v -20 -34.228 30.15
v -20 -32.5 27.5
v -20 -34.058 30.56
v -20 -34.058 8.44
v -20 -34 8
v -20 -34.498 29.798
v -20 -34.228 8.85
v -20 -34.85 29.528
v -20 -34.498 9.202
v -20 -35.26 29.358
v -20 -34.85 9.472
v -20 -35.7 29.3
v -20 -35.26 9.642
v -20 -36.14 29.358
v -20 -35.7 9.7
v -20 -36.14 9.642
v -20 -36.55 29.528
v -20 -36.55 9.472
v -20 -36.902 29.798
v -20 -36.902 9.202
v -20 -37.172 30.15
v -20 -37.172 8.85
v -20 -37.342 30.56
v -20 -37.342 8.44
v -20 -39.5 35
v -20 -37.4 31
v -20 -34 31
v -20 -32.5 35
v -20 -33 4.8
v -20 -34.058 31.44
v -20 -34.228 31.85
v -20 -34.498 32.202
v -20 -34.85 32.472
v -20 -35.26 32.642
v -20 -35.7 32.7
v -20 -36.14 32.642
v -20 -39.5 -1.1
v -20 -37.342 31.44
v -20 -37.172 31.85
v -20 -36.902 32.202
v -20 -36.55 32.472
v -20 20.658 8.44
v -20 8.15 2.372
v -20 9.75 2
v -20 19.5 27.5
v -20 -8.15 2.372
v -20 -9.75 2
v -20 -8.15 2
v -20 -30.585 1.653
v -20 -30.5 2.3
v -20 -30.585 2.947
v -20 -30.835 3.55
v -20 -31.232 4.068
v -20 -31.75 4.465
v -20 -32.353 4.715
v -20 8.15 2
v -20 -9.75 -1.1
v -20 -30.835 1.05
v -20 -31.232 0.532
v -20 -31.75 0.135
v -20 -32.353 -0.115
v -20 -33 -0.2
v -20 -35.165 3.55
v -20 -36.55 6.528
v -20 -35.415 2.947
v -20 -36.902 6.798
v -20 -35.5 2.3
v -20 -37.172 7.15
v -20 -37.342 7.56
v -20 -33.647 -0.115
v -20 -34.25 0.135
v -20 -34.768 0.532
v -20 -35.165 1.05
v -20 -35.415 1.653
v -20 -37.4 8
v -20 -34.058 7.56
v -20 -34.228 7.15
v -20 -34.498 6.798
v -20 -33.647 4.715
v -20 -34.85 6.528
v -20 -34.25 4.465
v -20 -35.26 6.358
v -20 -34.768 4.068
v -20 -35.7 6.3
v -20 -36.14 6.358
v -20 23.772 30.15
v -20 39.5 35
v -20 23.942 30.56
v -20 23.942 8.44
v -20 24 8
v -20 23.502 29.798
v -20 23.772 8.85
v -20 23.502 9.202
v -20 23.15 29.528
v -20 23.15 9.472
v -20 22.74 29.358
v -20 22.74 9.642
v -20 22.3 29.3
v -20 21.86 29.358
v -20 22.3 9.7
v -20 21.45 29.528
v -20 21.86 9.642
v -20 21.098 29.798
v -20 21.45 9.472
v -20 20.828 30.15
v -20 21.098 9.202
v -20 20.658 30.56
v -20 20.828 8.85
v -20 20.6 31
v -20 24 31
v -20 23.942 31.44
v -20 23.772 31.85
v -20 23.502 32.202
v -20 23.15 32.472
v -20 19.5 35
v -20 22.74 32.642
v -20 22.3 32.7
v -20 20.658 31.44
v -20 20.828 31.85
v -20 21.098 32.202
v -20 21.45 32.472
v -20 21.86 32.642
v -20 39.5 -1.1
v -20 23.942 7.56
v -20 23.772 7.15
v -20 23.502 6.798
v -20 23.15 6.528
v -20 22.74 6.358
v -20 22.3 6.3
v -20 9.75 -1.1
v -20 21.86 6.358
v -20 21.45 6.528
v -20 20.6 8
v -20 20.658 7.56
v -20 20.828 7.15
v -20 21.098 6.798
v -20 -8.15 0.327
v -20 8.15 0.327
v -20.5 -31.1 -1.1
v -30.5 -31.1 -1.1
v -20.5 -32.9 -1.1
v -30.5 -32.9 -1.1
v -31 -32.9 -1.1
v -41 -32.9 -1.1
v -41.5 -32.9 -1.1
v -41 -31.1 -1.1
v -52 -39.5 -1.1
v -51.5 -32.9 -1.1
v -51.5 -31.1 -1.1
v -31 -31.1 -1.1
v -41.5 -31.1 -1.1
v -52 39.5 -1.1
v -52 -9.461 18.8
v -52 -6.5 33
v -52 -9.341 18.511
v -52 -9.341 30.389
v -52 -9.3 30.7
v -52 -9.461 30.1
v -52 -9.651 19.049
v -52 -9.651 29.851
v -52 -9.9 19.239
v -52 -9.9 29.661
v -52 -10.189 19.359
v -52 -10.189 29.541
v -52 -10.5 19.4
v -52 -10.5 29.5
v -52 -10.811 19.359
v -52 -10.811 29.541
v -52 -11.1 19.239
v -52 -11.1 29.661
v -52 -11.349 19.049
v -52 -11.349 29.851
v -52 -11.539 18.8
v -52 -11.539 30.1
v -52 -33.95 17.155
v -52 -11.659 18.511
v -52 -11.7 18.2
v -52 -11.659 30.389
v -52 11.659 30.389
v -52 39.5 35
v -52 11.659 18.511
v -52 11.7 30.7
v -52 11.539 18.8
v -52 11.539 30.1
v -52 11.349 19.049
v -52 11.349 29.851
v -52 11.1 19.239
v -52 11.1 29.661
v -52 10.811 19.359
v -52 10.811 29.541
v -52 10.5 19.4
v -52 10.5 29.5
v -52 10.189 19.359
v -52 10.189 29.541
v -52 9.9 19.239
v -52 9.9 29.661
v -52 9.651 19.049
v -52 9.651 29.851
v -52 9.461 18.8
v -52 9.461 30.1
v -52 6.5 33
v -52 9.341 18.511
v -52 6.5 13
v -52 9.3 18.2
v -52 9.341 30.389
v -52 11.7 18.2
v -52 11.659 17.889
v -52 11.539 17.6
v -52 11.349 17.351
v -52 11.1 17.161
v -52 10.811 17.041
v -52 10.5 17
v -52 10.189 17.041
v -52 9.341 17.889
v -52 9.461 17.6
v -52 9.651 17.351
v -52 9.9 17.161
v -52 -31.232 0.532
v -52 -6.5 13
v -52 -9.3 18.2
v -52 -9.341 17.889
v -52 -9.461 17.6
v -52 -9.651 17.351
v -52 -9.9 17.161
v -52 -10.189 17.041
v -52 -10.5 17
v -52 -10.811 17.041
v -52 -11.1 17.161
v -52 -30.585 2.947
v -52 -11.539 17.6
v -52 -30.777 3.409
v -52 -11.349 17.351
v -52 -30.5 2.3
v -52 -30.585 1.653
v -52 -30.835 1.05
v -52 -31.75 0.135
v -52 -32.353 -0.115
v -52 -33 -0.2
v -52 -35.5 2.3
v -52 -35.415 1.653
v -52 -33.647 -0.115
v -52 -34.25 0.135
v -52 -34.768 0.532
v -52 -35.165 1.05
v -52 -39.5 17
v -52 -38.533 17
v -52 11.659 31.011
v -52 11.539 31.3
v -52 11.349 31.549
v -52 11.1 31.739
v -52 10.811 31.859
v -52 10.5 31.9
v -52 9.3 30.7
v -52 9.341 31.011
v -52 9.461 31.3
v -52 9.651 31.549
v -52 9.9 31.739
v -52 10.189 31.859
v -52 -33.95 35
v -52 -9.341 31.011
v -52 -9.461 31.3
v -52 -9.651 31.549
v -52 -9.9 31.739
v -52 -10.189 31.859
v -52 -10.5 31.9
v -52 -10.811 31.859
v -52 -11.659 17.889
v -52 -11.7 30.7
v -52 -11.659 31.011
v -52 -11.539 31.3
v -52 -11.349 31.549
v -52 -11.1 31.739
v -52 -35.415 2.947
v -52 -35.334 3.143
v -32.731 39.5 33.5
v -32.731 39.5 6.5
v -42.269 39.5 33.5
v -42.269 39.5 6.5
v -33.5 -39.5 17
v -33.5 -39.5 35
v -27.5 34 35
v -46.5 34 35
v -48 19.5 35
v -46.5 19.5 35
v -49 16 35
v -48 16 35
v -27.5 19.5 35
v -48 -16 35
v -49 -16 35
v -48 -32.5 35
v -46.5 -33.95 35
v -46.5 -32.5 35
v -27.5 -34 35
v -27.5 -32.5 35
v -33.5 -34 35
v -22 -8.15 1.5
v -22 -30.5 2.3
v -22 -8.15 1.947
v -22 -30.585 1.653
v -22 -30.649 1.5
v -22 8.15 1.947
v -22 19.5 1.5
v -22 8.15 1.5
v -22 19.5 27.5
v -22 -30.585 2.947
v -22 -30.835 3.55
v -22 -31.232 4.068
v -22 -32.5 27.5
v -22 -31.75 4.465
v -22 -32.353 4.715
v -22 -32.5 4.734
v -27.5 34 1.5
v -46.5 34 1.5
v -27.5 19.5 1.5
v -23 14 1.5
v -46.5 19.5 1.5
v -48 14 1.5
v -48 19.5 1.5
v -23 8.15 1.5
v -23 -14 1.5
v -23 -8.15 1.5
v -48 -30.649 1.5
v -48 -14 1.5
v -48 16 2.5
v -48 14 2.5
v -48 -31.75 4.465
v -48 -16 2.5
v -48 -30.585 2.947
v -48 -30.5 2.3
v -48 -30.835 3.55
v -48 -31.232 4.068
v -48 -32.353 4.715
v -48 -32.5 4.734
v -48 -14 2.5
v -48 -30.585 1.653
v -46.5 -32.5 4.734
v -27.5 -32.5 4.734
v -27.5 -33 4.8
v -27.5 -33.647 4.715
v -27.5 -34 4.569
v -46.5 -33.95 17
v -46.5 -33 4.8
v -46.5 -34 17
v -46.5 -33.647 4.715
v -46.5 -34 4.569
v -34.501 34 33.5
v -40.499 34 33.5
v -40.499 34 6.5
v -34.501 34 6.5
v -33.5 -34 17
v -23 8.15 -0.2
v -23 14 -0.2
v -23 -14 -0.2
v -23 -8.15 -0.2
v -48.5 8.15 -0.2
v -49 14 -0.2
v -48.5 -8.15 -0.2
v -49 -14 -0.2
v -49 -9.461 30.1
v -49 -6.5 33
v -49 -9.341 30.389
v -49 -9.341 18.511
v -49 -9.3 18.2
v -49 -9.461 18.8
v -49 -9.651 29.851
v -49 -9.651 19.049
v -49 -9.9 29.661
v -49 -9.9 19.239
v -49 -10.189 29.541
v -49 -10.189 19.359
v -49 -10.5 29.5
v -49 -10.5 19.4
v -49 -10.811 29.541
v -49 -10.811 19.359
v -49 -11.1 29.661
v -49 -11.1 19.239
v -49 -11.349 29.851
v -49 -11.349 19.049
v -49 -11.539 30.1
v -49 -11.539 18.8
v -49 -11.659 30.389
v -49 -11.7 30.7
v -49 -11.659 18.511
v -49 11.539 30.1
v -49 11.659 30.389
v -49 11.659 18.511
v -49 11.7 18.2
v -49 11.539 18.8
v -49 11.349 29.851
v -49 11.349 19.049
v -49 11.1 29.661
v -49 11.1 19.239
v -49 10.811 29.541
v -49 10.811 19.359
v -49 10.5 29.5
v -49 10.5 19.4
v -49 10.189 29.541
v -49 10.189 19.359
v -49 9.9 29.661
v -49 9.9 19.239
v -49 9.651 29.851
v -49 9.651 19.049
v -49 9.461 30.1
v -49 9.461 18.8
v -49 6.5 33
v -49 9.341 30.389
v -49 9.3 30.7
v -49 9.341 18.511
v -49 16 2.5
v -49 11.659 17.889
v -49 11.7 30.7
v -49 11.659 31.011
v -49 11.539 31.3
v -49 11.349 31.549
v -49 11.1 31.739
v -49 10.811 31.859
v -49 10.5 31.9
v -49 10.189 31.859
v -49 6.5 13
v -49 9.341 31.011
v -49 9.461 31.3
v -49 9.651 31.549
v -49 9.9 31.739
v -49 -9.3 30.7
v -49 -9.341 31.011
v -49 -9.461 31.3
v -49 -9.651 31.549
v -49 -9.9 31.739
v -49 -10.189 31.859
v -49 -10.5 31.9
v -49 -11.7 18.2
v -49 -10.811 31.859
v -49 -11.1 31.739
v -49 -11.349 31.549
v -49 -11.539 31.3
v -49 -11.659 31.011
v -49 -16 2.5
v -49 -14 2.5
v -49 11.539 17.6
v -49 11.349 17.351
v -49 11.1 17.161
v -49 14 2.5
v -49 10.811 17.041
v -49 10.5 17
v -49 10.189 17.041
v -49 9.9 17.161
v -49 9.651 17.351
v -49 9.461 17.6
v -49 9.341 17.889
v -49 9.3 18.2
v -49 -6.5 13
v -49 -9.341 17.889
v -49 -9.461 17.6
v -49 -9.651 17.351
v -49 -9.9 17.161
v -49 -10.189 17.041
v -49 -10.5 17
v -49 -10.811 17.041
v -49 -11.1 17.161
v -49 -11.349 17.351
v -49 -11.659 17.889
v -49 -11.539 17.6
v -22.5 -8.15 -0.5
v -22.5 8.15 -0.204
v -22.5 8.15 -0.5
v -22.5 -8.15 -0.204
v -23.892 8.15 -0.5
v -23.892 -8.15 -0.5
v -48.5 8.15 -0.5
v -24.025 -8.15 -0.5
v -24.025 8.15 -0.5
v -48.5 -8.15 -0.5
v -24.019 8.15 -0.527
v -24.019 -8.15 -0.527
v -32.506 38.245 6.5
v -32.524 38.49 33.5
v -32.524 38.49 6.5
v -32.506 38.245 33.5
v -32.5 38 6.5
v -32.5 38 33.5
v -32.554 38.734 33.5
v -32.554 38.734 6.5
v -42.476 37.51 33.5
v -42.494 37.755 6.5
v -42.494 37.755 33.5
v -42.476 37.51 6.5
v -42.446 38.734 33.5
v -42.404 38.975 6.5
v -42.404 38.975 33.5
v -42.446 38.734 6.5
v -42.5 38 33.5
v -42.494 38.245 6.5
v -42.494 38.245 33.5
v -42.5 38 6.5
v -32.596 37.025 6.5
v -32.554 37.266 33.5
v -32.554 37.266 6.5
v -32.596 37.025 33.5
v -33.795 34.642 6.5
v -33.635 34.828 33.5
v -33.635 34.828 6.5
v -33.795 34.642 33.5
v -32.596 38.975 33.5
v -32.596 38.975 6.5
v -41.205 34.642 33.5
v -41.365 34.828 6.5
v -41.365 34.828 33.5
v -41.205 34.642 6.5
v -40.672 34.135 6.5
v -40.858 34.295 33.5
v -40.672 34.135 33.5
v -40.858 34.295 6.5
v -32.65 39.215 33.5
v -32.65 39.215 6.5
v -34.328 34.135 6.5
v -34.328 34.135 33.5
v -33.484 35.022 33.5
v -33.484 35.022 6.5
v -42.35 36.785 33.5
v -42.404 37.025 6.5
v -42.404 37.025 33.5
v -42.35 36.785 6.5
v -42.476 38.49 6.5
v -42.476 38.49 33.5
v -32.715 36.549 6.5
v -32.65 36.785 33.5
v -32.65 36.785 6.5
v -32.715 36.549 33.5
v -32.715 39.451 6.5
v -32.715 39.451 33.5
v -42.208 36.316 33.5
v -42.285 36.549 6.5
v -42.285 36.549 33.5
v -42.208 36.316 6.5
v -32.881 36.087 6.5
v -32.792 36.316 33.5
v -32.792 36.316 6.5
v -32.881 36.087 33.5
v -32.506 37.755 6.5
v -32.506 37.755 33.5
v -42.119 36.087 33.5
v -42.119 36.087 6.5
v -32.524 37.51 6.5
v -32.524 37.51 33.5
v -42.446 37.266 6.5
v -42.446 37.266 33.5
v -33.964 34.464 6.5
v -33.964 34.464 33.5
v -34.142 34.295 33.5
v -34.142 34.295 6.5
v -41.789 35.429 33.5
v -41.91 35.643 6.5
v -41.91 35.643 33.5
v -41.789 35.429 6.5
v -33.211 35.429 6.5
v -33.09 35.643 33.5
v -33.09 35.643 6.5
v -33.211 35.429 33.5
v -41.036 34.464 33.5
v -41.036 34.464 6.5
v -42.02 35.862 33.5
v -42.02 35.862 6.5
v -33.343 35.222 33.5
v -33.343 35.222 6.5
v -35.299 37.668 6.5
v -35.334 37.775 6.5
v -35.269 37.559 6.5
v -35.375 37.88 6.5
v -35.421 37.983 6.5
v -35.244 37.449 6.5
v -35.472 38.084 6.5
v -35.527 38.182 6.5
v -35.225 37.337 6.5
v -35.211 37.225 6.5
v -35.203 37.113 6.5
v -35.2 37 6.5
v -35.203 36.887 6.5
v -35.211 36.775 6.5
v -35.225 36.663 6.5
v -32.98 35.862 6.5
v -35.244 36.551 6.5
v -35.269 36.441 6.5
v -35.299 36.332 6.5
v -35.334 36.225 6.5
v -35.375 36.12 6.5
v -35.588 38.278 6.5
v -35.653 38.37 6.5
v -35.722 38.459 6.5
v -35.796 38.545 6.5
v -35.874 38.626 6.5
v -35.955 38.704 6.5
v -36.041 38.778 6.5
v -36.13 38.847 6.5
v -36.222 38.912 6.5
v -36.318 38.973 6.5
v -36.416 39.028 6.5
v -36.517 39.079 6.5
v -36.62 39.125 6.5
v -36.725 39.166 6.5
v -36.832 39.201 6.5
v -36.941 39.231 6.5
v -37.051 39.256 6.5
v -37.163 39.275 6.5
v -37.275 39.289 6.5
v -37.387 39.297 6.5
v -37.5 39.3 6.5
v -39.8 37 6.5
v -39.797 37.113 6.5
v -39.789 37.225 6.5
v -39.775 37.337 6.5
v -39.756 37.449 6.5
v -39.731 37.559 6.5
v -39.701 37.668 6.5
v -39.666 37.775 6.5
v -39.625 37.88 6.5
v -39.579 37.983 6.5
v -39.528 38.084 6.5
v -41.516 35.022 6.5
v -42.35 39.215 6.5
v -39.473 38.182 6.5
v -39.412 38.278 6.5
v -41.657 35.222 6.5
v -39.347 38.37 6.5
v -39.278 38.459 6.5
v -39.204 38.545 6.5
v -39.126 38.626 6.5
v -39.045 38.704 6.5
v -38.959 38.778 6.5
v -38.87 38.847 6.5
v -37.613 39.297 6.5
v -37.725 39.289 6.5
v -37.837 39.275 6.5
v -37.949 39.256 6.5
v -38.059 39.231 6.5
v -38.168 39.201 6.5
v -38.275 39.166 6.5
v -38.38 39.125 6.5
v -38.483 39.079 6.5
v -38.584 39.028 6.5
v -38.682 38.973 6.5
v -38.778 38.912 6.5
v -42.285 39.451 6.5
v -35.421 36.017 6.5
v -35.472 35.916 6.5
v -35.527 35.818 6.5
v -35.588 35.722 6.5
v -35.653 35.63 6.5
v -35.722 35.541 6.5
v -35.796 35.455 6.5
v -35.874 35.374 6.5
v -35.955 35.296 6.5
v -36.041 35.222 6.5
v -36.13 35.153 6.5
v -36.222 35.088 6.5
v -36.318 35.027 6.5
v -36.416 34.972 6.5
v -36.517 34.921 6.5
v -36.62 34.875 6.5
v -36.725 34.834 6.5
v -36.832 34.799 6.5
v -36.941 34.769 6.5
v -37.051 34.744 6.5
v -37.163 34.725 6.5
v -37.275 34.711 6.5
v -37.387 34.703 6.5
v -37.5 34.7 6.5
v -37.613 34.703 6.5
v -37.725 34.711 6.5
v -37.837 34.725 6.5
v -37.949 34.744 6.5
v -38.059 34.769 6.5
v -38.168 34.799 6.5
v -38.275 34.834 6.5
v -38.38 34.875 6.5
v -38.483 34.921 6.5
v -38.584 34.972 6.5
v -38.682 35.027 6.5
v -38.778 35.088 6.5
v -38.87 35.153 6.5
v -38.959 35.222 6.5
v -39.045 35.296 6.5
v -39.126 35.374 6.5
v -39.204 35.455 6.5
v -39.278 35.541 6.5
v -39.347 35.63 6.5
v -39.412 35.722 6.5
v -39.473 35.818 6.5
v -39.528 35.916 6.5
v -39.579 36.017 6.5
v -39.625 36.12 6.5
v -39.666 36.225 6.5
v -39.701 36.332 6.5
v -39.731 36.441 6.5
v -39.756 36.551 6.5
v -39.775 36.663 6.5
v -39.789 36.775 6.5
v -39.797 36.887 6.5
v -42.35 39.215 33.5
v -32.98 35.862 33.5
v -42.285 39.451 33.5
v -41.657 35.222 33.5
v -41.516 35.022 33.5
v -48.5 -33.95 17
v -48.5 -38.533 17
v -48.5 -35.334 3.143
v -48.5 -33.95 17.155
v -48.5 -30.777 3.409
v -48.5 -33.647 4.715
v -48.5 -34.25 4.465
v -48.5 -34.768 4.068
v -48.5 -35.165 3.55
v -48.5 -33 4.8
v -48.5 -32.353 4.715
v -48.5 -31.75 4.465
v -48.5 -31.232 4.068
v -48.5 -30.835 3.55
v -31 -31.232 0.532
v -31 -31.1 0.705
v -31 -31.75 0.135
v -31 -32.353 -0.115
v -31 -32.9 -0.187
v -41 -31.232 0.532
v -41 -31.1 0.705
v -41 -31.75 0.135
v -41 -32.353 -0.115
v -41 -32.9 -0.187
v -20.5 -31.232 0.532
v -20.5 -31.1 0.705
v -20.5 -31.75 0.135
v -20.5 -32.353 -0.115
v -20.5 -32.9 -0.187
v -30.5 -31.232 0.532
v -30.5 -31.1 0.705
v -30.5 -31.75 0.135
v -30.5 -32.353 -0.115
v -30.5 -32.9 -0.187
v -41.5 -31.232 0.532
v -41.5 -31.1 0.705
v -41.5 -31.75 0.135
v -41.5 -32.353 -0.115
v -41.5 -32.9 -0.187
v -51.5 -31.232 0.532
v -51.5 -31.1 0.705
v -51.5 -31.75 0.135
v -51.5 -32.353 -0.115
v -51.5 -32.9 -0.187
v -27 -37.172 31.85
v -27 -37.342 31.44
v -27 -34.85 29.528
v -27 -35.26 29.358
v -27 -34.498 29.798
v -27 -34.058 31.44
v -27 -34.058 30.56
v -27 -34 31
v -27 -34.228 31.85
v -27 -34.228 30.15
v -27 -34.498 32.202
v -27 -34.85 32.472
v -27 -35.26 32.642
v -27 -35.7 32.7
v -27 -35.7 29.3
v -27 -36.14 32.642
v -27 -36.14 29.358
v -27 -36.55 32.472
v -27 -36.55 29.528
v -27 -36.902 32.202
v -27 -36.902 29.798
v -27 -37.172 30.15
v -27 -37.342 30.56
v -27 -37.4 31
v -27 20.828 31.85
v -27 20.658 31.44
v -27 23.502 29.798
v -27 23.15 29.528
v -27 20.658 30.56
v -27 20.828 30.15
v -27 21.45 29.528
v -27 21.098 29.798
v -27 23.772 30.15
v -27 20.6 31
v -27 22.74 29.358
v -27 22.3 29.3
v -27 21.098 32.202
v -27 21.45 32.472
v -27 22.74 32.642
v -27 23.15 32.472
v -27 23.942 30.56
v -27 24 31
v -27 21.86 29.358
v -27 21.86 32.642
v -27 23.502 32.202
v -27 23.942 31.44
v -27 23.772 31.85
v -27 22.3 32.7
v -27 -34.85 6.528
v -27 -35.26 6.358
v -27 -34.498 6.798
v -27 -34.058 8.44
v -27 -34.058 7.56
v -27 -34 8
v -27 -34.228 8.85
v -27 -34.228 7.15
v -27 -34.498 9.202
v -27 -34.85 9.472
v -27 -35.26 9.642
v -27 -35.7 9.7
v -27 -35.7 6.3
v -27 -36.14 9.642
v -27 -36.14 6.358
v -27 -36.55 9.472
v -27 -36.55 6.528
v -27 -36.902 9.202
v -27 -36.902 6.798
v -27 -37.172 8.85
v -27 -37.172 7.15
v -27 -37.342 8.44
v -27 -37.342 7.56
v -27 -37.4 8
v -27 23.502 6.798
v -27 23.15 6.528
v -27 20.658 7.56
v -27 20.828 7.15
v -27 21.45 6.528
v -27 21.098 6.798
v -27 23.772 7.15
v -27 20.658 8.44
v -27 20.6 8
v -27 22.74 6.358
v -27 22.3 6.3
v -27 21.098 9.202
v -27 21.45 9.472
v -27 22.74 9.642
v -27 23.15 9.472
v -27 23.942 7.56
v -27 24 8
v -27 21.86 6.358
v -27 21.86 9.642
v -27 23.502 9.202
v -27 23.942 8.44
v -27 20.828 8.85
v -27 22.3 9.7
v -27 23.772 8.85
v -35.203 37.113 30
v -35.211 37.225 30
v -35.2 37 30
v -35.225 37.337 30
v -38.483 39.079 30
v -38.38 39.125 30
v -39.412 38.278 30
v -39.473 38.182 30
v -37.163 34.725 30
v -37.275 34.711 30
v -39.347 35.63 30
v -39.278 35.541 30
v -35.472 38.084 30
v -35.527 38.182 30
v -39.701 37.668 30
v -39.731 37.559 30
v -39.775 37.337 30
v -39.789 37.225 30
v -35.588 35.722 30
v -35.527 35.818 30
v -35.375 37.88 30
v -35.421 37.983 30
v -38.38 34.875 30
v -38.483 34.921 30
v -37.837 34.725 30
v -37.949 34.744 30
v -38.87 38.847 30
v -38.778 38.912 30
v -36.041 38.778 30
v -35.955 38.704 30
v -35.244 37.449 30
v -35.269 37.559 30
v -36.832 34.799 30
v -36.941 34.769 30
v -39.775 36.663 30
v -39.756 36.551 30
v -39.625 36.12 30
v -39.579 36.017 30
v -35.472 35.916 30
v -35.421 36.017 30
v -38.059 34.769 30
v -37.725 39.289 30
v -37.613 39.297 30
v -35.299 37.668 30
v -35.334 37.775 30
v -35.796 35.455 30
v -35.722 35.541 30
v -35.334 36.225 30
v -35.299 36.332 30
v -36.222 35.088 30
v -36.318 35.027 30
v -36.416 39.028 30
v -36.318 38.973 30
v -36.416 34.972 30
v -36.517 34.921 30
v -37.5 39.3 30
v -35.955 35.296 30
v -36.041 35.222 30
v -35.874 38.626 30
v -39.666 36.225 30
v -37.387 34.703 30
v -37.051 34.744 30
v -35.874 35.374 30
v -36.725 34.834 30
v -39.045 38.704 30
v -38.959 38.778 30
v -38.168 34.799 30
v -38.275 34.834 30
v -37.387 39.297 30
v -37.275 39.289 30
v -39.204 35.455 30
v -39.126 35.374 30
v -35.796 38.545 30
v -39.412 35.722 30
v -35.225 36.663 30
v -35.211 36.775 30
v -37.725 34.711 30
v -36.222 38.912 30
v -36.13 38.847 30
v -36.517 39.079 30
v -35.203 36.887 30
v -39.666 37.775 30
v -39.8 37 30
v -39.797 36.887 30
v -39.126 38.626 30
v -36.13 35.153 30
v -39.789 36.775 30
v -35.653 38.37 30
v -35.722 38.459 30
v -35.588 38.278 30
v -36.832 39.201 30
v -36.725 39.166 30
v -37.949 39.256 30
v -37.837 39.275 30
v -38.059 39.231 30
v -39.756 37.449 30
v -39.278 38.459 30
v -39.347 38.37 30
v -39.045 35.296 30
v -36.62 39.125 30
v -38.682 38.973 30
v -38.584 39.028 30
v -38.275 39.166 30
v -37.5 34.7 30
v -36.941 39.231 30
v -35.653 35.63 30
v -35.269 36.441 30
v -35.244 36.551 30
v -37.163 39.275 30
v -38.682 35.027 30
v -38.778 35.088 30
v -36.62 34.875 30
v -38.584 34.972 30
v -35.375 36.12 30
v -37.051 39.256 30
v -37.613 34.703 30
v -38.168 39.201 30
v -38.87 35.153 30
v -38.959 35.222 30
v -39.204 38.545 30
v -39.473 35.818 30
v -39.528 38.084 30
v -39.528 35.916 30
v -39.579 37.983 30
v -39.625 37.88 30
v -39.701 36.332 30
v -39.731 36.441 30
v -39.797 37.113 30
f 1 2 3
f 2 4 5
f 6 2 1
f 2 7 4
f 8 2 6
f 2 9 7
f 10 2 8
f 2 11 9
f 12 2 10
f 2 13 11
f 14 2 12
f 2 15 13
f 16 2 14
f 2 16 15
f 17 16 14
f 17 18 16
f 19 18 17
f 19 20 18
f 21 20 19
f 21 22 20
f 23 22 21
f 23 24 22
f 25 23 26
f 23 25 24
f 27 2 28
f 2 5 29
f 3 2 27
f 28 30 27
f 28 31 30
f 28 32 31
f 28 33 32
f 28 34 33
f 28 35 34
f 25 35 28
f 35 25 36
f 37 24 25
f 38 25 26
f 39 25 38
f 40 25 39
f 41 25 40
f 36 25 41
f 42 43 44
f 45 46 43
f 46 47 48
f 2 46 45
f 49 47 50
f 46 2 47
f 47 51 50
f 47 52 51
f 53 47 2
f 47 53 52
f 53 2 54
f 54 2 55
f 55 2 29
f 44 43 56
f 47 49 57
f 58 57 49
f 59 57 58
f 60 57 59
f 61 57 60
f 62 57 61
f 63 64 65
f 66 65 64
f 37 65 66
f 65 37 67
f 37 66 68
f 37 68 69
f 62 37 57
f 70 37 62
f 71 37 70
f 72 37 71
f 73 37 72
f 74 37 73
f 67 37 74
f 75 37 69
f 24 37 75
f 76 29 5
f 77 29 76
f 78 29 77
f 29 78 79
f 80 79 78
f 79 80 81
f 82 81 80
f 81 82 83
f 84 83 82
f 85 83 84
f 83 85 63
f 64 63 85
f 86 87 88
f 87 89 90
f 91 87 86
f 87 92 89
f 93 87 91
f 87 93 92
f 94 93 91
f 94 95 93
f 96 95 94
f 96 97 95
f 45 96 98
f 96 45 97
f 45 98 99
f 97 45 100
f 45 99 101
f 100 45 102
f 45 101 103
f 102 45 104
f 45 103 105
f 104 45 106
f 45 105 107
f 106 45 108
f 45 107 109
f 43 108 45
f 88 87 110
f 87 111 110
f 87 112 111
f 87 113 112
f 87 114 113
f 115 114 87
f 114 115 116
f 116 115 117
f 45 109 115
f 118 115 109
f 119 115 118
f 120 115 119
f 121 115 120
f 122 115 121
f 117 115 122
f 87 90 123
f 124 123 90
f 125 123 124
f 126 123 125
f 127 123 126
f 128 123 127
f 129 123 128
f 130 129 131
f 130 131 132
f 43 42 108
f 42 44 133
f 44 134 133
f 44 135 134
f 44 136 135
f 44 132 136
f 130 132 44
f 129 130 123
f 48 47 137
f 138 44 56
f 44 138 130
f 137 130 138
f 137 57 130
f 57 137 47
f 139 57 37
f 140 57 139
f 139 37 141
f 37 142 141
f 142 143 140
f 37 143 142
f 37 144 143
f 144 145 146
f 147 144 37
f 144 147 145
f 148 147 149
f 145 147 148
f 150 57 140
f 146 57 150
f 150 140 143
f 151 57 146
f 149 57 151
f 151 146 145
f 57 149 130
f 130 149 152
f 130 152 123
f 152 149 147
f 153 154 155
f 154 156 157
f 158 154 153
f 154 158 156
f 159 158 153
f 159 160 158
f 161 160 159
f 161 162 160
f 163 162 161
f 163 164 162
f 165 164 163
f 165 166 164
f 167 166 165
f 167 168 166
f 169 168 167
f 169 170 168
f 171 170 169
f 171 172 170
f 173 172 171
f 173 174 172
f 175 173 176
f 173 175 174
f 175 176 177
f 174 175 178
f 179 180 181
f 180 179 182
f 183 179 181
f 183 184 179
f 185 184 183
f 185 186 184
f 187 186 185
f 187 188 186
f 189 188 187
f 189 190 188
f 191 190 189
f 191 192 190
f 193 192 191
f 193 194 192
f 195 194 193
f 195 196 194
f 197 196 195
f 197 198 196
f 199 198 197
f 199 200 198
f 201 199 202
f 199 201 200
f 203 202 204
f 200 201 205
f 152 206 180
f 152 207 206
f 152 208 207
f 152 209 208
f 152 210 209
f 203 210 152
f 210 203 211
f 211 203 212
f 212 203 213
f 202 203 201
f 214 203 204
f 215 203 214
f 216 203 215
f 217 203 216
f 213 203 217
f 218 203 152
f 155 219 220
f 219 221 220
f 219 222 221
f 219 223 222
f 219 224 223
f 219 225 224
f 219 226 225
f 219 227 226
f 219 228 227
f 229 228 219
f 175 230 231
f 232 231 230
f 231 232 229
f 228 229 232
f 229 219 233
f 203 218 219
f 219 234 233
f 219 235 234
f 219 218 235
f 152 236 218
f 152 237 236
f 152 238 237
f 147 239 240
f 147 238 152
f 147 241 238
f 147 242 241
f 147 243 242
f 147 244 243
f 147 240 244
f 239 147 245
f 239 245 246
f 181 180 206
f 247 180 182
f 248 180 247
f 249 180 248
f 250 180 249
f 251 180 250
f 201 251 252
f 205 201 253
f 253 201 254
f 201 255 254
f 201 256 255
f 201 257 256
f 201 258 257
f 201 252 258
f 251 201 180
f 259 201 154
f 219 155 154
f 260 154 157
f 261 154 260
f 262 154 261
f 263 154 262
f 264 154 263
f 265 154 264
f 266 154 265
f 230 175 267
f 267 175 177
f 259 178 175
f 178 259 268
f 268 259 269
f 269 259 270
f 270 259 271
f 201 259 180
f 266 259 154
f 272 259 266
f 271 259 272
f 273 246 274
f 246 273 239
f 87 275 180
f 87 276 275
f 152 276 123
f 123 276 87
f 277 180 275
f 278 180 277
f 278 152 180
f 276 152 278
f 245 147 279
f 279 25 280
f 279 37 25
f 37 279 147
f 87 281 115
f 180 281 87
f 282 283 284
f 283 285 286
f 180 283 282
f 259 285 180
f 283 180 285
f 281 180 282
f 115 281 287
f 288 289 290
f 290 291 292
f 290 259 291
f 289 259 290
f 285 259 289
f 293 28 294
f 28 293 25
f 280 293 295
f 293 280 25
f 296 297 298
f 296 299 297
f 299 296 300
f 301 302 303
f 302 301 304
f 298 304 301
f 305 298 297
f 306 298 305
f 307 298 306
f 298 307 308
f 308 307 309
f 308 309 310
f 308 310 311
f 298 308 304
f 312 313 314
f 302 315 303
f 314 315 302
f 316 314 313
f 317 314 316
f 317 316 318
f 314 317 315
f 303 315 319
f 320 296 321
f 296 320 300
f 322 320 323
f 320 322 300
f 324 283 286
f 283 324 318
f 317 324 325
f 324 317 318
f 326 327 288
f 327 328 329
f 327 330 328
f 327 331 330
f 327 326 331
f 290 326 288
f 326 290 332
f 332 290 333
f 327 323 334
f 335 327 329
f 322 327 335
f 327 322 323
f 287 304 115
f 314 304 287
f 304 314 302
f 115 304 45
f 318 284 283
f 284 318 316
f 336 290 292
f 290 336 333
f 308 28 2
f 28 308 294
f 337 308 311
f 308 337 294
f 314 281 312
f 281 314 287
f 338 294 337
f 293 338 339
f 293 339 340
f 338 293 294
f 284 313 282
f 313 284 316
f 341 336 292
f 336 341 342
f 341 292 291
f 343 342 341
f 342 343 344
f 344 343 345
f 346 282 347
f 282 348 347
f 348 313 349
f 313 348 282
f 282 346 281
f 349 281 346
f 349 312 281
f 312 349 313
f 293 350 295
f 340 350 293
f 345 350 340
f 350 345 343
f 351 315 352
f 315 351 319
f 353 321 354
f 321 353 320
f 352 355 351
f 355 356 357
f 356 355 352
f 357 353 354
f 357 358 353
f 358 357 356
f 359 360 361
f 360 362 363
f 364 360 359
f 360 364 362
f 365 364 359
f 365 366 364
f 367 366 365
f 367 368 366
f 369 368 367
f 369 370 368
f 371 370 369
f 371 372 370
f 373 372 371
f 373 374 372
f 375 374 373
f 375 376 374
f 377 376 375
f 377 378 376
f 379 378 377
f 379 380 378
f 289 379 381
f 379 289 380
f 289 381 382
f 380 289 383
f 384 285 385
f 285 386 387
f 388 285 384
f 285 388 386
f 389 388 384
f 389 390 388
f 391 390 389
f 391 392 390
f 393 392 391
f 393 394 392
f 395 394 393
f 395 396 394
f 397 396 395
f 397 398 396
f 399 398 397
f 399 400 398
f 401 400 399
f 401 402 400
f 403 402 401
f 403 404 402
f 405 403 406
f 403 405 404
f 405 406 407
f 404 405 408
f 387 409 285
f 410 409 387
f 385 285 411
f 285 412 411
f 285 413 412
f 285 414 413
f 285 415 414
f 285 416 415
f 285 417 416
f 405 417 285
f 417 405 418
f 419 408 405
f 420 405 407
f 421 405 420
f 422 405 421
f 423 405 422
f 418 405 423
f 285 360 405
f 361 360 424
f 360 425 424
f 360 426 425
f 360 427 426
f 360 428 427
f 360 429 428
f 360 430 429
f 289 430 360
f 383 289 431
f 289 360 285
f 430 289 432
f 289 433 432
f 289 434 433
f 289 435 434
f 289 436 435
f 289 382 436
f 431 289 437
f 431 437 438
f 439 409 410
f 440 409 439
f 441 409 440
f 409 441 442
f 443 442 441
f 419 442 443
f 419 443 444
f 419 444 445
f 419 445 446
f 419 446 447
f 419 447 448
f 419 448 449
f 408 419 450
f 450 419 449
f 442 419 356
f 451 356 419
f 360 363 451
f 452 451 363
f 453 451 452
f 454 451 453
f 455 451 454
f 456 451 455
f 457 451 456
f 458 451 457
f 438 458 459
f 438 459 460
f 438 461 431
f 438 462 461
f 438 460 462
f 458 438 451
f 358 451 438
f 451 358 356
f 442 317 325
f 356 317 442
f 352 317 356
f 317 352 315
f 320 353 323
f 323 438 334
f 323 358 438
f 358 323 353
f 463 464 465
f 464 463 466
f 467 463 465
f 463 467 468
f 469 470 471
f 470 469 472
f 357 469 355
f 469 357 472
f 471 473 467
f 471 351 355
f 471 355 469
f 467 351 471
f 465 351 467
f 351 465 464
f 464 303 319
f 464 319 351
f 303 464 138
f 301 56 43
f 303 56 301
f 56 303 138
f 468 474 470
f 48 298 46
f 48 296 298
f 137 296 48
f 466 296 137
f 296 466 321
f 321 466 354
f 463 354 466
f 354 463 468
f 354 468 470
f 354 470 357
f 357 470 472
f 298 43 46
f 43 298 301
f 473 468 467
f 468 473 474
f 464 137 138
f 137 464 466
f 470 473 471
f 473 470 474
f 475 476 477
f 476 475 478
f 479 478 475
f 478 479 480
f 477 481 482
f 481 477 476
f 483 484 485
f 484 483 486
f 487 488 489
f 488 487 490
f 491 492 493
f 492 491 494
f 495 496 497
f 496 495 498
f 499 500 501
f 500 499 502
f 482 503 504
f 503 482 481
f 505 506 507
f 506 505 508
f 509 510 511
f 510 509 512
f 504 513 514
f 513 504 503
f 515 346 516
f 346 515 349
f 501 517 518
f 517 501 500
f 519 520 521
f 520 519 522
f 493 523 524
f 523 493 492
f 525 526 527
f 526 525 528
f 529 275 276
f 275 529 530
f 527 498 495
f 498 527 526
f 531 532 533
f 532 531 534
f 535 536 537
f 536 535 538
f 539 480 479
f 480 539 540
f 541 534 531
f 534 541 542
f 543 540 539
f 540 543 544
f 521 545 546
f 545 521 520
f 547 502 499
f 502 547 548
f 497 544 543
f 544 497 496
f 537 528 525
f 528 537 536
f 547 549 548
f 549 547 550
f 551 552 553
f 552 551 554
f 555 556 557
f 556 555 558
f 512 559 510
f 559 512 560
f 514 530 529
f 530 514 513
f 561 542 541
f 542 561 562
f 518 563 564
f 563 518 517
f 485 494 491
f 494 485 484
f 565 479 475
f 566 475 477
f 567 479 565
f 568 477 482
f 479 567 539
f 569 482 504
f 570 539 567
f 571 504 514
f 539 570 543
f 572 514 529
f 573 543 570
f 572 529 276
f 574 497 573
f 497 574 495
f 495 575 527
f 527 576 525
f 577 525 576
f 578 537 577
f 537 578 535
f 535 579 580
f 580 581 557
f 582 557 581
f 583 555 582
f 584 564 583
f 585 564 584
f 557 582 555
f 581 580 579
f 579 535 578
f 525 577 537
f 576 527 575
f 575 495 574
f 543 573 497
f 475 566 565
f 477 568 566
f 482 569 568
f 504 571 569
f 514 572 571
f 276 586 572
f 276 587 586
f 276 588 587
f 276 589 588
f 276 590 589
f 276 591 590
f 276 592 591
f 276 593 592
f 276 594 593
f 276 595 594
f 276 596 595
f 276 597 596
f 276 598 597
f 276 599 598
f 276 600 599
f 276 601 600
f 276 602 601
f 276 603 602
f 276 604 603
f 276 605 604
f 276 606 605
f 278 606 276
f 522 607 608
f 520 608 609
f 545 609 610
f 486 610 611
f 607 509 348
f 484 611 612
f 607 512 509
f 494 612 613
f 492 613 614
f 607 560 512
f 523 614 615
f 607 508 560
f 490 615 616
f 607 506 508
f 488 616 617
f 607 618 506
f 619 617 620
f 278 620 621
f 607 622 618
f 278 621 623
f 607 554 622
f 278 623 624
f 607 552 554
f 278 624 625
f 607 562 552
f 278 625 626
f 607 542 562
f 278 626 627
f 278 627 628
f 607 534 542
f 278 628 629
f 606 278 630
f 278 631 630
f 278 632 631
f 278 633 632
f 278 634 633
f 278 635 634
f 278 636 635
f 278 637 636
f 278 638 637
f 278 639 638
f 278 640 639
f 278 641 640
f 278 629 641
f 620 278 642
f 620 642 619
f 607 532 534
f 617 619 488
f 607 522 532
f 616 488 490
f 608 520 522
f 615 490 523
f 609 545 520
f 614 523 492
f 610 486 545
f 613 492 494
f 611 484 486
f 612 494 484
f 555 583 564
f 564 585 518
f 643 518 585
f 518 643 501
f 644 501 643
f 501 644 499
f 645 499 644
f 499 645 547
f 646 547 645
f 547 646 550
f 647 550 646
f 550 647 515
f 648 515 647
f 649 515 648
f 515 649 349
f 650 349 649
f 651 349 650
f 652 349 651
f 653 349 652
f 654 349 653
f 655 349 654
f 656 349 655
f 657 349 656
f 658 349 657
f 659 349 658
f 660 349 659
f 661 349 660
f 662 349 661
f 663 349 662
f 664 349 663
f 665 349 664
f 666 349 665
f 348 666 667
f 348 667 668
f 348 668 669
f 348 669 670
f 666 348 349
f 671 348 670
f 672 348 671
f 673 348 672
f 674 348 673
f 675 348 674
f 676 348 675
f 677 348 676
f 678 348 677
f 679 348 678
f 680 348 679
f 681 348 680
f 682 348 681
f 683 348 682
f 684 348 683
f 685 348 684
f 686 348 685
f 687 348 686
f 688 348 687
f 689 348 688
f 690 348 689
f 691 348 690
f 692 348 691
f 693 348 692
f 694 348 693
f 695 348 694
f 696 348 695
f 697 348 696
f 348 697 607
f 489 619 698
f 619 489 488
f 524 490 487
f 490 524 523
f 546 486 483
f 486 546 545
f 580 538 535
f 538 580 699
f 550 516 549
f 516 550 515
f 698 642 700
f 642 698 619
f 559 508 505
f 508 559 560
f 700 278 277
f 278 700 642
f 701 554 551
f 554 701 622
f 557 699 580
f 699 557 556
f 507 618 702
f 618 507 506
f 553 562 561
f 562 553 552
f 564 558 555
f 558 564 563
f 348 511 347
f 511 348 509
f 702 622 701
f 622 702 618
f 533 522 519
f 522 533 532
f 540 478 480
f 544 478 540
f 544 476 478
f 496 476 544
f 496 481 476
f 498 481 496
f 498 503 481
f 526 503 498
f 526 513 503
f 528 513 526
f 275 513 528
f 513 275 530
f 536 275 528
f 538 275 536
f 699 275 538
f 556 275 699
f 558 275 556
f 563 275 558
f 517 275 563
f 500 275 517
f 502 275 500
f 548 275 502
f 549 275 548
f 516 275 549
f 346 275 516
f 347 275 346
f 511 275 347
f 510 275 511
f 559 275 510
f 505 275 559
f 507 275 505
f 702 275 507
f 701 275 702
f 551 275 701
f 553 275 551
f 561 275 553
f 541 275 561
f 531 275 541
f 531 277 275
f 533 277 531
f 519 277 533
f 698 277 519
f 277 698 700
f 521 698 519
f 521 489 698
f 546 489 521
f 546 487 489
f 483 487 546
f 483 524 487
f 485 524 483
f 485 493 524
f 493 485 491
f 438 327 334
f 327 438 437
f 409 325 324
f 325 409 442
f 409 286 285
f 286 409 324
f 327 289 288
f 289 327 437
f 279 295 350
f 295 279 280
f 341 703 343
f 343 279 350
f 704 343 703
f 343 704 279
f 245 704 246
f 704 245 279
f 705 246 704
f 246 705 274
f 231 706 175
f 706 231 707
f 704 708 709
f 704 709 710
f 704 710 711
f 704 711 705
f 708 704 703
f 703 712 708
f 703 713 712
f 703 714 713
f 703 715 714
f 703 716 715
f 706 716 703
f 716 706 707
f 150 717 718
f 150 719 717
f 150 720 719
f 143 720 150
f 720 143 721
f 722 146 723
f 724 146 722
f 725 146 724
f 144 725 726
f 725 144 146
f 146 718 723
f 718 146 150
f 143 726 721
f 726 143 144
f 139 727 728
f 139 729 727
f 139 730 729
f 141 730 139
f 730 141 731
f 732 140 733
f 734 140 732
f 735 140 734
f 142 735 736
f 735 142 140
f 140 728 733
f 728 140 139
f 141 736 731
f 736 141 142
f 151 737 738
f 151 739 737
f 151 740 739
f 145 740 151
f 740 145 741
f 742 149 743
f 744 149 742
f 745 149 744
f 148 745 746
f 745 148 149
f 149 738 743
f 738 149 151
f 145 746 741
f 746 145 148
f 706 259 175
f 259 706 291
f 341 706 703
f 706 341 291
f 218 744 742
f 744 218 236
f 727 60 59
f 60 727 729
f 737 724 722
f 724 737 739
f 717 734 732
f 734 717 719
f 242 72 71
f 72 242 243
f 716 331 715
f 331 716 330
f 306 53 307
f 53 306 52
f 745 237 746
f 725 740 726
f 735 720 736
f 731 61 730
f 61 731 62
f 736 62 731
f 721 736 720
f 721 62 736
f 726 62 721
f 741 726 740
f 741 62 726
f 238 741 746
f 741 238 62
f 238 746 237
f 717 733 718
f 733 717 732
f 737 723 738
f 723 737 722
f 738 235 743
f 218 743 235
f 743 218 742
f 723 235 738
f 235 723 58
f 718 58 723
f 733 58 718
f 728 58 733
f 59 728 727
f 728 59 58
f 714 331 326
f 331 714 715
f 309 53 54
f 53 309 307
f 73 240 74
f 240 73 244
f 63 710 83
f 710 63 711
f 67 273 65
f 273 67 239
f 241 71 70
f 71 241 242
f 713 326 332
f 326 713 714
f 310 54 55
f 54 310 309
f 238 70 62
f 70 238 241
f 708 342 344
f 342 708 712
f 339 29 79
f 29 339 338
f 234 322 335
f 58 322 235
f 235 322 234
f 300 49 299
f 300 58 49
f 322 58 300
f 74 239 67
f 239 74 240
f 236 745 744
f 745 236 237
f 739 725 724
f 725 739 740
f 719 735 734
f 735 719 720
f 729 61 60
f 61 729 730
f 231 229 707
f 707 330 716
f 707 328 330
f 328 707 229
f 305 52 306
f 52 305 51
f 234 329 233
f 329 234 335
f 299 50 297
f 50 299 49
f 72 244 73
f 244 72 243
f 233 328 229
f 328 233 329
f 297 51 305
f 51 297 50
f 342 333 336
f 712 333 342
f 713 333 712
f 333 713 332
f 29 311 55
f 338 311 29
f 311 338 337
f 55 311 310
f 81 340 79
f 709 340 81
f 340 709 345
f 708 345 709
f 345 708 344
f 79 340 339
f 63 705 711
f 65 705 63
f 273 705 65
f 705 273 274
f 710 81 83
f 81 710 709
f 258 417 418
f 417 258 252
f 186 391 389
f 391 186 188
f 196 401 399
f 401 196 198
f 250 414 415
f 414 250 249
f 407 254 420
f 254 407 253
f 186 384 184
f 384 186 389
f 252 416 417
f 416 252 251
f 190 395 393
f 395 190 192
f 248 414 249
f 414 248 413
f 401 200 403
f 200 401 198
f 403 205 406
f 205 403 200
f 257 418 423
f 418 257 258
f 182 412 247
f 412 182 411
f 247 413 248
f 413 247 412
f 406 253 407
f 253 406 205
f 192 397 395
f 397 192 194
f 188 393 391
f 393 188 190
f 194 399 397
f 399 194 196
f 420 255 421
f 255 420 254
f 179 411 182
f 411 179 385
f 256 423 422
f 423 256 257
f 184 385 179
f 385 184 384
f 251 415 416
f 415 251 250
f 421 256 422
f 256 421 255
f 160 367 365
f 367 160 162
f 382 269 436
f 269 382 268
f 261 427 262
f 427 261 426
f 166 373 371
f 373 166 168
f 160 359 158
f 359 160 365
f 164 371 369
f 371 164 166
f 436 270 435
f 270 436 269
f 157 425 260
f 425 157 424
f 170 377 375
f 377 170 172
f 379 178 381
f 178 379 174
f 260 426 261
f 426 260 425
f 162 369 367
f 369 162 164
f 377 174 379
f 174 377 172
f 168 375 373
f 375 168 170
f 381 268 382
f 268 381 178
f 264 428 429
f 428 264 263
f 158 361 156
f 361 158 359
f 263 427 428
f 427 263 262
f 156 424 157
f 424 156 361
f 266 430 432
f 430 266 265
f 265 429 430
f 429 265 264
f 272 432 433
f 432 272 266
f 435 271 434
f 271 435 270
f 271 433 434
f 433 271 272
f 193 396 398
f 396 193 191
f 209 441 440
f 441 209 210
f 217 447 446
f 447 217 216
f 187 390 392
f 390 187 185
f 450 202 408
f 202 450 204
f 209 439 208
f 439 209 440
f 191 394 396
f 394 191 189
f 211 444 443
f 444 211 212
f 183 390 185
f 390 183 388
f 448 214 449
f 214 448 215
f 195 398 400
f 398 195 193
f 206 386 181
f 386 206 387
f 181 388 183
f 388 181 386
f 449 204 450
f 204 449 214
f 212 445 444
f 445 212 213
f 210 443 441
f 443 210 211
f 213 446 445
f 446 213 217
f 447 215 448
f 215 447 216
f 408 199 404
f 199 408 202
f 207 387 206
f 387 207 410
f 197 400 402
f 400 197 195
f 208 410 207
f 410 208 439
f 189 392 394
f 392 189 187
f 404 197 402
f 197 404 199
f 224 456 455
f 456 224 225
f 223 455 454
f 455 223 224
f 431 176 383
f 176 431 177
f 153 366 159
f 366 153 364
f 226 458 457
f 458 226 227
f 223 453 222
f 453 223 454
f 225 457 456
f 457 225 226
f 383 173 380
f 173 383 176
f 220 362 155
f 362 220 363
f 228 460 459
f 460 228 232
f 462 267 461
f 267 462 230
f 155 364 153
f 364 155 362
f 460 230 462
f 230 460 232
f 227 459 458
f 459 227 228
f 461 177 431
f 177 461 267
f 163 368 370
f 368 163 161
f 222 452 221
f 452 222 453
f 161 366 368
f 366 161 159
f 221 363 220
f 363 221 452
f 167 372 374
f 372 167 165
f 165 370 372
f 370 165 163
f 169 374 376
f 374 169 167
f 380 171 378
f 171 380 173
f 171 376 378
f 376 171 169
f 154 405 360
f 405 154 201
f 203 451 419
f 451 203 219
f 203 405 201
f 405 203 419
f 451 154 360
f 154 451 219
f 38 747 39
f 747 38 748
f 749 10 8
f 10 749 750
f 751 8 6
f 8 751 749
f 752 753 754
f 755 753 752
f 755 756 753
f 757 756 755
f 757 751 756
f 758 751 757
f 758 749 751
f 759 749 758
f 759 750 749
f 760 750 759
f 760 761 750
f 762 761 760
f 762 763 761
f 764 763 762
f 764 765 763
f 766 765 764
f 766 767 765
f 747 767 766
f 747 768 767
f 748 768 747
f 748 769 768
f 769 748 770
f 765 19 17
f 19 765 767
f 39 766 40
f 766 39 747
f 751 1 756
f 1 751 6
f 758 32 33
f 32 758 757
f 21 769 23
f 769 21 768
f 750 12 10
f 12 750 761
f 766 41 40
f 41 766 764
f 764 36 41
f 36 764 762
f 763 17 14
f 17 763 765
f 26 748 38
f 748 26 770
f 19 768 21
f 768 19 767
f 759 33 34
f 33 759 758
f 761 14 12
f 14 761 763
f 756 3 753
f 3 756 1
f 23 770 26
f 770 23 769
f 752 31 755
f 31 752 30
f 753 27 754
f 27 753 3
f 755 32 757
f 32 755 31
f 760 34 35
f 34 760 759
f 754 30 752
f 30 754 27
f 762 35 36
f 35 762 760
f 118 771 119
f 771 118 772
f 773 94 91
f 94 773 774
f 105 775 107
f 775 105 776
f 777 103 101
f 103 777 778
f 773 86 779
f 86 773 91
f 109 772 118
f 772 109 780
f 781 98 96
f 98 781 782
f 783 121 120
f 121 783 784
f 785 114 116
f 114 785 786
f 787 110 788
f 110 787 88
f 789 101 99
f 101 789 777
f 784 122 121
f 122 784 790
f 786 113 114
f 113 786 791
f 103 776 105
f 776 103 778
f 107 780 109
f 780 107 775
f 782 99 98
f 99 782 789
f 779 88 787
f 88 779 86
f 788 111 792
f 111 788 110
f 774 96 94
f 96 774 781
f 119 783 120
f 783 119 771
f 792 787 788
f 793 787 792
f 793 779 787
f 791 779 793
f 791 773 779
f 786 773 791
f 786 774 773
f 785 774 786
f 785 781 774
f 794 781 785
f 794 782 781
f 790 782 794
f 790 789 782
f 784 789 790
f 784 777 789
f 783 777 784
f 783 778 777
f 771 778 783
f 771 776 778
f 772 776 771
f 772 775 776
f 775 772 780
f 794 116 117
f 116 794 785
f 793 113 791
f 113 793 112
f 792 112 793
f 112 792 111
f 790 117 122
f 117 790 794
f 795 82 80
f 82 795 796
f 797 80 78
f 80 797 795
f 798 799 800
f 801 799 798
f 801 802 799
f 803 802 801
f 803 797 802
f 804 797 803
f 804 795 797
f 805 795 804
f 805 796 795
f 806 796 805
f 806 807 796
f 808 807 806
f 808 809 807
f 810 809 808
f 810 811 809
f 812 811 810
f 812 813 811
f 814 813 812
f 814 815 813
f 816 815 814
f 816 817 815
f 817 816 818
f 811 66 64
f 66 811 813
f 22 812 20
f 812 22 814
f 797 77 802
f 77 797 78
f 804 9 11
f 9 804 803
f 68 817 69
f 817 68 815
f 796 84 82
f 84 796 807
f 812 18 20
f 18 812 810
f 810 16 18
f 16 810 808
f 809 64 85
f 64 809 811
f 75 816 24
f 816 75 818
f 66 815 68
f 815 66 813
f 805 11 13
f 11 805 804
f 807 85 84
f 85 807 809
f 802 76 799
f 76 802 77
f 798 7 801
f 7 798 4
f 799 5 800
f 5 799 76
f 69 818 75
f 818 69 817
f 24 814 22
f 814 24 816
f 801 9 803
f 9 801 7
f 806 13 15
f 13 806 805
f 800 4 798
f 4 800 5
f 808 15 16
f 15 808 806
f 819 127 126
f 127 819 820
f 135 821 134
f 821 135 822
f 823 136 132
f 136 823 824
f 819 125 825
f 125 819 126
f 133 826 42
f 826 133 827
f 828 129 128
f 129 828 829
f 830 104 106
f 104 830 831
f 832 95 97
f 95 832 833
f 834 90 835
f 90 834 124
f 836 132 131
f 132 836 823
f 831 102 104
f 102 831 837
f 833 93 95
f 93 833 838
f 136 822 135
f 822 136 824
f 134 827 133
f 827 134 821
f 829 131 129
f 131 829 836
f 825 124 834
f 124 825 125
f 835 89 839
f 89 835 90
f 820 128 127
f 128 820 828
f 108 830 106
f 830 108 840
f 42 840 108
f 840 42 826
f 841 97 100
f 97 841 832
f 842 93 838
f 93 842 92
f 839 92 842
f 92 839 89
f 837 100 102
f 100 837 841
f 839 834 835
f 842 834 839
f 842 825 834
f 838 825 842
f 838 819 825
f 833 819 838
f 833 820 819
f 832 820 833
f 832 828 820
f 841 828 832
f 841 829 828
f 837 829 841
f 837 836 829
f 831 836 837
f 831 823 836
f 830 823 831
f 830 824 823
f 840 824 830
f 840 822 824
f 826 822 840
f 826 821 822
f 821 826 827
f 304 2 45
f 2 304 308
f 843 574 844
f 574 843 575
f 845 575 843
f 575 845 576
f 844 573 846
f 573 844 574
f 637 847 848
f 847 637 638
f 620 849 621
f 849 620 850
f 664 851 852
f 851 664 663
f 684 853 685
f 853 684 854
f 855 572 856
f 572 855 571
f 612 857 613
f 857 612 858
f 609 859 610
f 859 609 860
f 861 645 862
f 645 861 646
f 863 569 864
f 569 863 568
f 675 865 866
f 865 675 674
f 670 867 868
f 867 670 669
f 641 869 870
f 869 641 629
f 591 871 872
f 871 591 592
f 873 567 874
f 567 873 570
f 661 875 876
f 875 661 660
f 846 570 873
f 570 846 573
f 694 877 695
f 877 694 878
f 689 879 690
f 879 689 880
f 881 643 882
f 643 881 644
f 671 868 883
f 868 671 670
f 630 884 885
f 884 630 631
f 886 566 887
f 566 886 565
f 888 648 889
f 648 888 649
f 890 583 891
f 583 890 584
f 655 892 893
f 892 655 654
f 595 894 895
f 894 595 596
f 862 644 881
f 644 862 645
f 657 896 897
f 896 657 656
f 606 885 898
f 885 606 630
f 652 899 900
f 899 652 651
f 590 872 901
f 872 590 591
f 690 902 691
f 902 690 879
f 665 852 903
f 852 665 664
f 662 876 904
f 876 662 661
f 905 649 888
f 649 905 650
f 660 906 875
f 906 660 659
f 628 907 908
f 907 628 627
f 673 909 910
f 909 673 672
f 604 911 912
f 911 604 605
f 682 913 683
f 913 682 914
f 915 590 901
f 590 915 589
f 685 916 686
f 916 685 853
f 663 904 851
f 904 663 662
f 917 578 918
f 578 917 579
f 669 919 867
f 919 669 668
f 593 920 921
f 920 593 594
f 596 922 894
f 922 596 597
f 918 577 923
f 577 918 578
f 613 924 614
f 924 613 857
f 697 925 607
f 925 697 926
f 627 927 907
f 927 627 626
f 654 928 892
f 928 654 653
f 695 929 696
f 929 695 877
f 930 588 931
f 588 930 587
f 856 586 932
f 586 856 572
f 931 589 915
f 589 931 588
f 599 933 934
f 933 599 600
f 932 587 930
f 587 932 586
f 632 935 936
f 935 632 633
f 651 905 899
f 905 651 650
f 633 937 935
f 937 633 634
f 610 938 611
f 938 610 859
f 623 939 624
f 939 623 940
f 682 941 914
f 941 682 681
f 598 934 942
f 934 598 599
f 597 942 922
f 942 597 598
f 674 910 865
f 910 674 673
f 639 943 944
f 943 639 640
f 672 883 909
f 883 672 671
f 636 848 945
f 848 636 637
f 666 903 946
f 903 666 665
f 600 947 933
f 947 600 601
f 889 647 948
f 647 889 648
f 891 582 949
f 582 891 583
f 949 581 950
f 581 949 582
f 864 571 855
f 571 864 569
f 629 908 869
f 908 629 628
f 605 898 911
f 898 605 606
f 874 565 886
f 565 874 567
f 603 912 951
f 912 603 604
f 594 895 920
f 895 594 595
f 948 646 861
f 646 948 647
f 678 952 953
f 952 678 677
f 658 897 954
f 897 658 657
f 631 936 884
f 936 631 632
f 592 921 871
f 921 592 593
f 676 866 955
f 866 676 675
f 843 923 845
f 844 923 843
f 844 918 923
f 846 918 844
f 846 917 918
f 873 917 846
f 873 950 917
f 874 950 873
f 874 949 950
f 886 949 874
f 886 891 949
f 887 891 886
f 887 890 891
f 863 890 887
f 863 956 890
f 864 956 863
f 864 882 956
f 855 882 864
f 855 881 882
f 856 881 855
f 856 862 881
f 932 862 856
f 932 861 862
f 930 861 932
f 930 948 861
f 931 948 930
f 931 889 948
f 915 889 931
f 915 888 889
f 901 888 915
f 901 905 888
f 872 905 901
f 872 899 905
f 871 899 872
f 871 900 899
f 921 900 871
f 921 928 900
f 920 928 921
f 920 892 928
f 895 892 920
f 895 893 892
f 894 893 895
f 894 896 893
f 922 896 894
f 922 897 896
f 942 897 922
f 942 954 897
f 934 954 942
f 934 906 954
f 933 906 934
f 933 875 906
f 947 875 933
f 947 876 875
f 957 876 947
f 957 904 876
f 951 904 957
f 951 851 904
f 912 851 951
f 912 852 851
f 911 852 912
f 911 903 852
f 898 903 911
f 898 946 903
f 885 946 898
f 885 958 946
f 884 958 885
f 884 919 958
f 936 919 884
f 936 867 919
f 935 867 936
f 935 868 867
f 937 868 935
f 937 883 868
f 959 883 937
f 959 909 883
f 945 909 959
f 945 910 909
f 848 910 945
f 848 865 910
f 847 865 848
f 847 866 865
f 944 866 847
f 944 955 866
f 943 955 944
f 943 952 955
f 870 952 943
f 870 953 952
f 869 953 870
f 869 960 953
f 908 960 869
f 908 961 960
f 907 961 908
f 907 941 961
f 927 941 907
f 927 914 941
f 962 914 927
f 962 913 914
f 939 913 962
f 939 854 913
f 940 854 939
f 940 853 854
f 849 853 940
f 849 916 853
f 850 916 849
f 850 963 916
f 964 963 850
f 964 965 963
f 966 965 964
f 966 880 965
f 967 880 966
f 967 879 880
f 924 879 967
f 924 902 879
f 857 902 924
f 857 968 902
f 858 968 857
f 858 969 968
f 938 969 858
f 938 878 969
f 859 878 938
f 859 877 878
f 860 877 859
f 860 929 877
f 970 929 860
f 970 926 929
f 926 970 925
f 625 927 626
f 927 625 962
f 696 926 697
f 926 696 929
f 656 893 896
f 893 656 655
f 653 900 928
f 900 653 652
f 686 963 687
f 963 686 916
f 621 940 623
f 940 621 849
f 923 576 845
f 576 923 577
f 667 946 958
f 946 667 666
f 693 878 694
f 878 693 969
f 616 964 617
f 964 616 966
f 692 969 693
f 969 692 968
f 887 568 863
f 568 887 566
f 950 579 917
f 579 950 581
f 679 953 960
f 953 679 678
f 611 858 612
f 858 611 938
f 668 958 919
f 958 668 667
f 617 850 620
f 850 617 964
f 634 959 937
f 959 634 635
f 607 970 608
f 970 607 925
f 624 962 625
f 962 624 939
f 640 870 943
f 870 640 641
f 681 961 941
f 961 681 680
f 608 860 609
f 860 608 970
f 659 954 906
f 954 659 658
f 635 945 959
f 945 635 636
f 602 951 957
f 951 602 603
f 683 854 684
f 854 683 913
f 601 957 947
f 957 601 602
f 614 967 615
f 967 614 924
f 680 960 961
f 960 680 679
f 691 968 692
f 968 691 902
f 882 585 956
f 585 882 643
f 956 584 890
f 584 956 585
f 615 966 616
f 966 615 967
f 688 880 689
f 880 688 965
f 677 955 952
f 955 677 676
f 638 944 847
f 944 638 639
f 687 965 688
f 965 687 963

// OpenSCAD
union () {
difference(){
union(){
translate([-36,0,2.4])cube([32,79,7], center=true);    
translate([-13,0,19.5])cube([78,79,31], center=true); 
translate([-23.5,-4.5,19.5])cube([8,69,31], center=true);

}
    //Cube LiPo Battery
    translate([-35,-6.5,20])cube([26,52,37], center=true);

    //Dual cylinder lipo Adafruit style
    translate([-37,0,20])cube([19,68,37], center=true);
    
    //Cavity for camera cable
    translate([-36,0,4.5])cube([26,28,9.4], center=true);
    translate([-35.5,0,0.7])cube([26,16.3,2.4], center=true);
    translate([-12,0,3.05]) rotate([0,-12,0]) cube([25,16.3,2], center=true);

    //Camera cable routing
    #translate([-37.5,38,20])  rotate([0,0,0])   cylinder(27, r1=5, r2=5, center=true,$fn=128);


    //Holes for battery terminals and solar plug
    translate([30,-30,16])cube([100,40.5,40], center=true);
    translate([30,30,16])cube([100,40.5,40], center=true);
    
    //Camera installation
    translate([-39,0,20])cube([20,32,35], center=true);
    
     //battery cable routing
    translate([-37,-37,27])  cube([7,10,20], center=true);
    translate([-52,-35.3,13]) rotate([13,0,0])  cube([7,4.5,21], center=true);
    translate([-36,-32,0])  cube([10,1.8,6], center=true);
    translate([-25.5,-32,0])  cube([10,1.8,6], center=true);
    translate([-46.5,-32,0])  cube([10,1.8,6], center=true);

    //translate([-46.5,-37.5,20.7])rotate([0,90,0])   cylinder(h=12.05, r1=3.75, r2=3.75, center=true,$fn=24);
    translate([-46,-39.5,29])  cube([20,11.1,24], center=true);
   
    translate([-35,-33,2.3])rotate([0,90,0])   cylinder(h=35, r1=2.5, r2=2.5, center=true,$fn=24);
    
    //camera holes
    translate([-51,10.5,30.7])rotate([0,90,0])   cylinder(h=5, r1=1.2, r2=1.2, center=true,$fn=24);
    translate([-51,-10.5,30.7])rotate([0,90,0])   cylinder(h=5, r1=1.2, r2=1.2, center=true,$fn=24);
    translate([-51,10.5,18.2])rotate([0,90,0])   cylinder(h=5, r1=1.2, r2=1.2, center=true,$fn=24);
    translate([-51,-10.5,18.2])rotate([0,90,0])   cylinder(h=5, r1=1.2, r2=1.2, center=true,$fn=24);

    //camera cutout
    translate([-52,0,23])cube([8,13,20], center=true);
    
     //Pi Zero holes  
    translate([-17,-35.7,31])rotate([0,90,0])   cylinder(h=20, r1=1.7, r2=1.7, center=true,$fn=24);
    translate([-17,22.3,31])rotate([0,90,0])   cylinder(h=20, r1=1.7, r2=1.7, center=true,$fn=24);
    translate([-17,-35.7,8])rotate([0,90,0])   cylinder(h=20, r1=1.7, r2=1.7, center=true,$fn=24);
    translate([-17,22.3,8])rotate([0,90,0])   cylinder(h=20, r1=1.7, r2=1.7, center=true,$fn=24);
    
    //Pi 4 cutout 85.6mm × 56.5mm
    //translate([52,0.8,25])cube([58,87,30], center=true);
    //Pi Zero cut out 65mm x 30mm
    //translate([6,-9,22])cube([42,120,33], center=true);
    
    //Pi PCB cutout
    translate([16,-6.5,20])cube([72,70.5,36], center=true);
    translate([5,-6.5,35])cube([60,52,15], center=true);

}
//Camera cable routing
translate([-37.5,37,15])  rotate([0,0,0])   cylinder(30, r1=2.3, r2=2.3, center=true,$fn=128);
        }
